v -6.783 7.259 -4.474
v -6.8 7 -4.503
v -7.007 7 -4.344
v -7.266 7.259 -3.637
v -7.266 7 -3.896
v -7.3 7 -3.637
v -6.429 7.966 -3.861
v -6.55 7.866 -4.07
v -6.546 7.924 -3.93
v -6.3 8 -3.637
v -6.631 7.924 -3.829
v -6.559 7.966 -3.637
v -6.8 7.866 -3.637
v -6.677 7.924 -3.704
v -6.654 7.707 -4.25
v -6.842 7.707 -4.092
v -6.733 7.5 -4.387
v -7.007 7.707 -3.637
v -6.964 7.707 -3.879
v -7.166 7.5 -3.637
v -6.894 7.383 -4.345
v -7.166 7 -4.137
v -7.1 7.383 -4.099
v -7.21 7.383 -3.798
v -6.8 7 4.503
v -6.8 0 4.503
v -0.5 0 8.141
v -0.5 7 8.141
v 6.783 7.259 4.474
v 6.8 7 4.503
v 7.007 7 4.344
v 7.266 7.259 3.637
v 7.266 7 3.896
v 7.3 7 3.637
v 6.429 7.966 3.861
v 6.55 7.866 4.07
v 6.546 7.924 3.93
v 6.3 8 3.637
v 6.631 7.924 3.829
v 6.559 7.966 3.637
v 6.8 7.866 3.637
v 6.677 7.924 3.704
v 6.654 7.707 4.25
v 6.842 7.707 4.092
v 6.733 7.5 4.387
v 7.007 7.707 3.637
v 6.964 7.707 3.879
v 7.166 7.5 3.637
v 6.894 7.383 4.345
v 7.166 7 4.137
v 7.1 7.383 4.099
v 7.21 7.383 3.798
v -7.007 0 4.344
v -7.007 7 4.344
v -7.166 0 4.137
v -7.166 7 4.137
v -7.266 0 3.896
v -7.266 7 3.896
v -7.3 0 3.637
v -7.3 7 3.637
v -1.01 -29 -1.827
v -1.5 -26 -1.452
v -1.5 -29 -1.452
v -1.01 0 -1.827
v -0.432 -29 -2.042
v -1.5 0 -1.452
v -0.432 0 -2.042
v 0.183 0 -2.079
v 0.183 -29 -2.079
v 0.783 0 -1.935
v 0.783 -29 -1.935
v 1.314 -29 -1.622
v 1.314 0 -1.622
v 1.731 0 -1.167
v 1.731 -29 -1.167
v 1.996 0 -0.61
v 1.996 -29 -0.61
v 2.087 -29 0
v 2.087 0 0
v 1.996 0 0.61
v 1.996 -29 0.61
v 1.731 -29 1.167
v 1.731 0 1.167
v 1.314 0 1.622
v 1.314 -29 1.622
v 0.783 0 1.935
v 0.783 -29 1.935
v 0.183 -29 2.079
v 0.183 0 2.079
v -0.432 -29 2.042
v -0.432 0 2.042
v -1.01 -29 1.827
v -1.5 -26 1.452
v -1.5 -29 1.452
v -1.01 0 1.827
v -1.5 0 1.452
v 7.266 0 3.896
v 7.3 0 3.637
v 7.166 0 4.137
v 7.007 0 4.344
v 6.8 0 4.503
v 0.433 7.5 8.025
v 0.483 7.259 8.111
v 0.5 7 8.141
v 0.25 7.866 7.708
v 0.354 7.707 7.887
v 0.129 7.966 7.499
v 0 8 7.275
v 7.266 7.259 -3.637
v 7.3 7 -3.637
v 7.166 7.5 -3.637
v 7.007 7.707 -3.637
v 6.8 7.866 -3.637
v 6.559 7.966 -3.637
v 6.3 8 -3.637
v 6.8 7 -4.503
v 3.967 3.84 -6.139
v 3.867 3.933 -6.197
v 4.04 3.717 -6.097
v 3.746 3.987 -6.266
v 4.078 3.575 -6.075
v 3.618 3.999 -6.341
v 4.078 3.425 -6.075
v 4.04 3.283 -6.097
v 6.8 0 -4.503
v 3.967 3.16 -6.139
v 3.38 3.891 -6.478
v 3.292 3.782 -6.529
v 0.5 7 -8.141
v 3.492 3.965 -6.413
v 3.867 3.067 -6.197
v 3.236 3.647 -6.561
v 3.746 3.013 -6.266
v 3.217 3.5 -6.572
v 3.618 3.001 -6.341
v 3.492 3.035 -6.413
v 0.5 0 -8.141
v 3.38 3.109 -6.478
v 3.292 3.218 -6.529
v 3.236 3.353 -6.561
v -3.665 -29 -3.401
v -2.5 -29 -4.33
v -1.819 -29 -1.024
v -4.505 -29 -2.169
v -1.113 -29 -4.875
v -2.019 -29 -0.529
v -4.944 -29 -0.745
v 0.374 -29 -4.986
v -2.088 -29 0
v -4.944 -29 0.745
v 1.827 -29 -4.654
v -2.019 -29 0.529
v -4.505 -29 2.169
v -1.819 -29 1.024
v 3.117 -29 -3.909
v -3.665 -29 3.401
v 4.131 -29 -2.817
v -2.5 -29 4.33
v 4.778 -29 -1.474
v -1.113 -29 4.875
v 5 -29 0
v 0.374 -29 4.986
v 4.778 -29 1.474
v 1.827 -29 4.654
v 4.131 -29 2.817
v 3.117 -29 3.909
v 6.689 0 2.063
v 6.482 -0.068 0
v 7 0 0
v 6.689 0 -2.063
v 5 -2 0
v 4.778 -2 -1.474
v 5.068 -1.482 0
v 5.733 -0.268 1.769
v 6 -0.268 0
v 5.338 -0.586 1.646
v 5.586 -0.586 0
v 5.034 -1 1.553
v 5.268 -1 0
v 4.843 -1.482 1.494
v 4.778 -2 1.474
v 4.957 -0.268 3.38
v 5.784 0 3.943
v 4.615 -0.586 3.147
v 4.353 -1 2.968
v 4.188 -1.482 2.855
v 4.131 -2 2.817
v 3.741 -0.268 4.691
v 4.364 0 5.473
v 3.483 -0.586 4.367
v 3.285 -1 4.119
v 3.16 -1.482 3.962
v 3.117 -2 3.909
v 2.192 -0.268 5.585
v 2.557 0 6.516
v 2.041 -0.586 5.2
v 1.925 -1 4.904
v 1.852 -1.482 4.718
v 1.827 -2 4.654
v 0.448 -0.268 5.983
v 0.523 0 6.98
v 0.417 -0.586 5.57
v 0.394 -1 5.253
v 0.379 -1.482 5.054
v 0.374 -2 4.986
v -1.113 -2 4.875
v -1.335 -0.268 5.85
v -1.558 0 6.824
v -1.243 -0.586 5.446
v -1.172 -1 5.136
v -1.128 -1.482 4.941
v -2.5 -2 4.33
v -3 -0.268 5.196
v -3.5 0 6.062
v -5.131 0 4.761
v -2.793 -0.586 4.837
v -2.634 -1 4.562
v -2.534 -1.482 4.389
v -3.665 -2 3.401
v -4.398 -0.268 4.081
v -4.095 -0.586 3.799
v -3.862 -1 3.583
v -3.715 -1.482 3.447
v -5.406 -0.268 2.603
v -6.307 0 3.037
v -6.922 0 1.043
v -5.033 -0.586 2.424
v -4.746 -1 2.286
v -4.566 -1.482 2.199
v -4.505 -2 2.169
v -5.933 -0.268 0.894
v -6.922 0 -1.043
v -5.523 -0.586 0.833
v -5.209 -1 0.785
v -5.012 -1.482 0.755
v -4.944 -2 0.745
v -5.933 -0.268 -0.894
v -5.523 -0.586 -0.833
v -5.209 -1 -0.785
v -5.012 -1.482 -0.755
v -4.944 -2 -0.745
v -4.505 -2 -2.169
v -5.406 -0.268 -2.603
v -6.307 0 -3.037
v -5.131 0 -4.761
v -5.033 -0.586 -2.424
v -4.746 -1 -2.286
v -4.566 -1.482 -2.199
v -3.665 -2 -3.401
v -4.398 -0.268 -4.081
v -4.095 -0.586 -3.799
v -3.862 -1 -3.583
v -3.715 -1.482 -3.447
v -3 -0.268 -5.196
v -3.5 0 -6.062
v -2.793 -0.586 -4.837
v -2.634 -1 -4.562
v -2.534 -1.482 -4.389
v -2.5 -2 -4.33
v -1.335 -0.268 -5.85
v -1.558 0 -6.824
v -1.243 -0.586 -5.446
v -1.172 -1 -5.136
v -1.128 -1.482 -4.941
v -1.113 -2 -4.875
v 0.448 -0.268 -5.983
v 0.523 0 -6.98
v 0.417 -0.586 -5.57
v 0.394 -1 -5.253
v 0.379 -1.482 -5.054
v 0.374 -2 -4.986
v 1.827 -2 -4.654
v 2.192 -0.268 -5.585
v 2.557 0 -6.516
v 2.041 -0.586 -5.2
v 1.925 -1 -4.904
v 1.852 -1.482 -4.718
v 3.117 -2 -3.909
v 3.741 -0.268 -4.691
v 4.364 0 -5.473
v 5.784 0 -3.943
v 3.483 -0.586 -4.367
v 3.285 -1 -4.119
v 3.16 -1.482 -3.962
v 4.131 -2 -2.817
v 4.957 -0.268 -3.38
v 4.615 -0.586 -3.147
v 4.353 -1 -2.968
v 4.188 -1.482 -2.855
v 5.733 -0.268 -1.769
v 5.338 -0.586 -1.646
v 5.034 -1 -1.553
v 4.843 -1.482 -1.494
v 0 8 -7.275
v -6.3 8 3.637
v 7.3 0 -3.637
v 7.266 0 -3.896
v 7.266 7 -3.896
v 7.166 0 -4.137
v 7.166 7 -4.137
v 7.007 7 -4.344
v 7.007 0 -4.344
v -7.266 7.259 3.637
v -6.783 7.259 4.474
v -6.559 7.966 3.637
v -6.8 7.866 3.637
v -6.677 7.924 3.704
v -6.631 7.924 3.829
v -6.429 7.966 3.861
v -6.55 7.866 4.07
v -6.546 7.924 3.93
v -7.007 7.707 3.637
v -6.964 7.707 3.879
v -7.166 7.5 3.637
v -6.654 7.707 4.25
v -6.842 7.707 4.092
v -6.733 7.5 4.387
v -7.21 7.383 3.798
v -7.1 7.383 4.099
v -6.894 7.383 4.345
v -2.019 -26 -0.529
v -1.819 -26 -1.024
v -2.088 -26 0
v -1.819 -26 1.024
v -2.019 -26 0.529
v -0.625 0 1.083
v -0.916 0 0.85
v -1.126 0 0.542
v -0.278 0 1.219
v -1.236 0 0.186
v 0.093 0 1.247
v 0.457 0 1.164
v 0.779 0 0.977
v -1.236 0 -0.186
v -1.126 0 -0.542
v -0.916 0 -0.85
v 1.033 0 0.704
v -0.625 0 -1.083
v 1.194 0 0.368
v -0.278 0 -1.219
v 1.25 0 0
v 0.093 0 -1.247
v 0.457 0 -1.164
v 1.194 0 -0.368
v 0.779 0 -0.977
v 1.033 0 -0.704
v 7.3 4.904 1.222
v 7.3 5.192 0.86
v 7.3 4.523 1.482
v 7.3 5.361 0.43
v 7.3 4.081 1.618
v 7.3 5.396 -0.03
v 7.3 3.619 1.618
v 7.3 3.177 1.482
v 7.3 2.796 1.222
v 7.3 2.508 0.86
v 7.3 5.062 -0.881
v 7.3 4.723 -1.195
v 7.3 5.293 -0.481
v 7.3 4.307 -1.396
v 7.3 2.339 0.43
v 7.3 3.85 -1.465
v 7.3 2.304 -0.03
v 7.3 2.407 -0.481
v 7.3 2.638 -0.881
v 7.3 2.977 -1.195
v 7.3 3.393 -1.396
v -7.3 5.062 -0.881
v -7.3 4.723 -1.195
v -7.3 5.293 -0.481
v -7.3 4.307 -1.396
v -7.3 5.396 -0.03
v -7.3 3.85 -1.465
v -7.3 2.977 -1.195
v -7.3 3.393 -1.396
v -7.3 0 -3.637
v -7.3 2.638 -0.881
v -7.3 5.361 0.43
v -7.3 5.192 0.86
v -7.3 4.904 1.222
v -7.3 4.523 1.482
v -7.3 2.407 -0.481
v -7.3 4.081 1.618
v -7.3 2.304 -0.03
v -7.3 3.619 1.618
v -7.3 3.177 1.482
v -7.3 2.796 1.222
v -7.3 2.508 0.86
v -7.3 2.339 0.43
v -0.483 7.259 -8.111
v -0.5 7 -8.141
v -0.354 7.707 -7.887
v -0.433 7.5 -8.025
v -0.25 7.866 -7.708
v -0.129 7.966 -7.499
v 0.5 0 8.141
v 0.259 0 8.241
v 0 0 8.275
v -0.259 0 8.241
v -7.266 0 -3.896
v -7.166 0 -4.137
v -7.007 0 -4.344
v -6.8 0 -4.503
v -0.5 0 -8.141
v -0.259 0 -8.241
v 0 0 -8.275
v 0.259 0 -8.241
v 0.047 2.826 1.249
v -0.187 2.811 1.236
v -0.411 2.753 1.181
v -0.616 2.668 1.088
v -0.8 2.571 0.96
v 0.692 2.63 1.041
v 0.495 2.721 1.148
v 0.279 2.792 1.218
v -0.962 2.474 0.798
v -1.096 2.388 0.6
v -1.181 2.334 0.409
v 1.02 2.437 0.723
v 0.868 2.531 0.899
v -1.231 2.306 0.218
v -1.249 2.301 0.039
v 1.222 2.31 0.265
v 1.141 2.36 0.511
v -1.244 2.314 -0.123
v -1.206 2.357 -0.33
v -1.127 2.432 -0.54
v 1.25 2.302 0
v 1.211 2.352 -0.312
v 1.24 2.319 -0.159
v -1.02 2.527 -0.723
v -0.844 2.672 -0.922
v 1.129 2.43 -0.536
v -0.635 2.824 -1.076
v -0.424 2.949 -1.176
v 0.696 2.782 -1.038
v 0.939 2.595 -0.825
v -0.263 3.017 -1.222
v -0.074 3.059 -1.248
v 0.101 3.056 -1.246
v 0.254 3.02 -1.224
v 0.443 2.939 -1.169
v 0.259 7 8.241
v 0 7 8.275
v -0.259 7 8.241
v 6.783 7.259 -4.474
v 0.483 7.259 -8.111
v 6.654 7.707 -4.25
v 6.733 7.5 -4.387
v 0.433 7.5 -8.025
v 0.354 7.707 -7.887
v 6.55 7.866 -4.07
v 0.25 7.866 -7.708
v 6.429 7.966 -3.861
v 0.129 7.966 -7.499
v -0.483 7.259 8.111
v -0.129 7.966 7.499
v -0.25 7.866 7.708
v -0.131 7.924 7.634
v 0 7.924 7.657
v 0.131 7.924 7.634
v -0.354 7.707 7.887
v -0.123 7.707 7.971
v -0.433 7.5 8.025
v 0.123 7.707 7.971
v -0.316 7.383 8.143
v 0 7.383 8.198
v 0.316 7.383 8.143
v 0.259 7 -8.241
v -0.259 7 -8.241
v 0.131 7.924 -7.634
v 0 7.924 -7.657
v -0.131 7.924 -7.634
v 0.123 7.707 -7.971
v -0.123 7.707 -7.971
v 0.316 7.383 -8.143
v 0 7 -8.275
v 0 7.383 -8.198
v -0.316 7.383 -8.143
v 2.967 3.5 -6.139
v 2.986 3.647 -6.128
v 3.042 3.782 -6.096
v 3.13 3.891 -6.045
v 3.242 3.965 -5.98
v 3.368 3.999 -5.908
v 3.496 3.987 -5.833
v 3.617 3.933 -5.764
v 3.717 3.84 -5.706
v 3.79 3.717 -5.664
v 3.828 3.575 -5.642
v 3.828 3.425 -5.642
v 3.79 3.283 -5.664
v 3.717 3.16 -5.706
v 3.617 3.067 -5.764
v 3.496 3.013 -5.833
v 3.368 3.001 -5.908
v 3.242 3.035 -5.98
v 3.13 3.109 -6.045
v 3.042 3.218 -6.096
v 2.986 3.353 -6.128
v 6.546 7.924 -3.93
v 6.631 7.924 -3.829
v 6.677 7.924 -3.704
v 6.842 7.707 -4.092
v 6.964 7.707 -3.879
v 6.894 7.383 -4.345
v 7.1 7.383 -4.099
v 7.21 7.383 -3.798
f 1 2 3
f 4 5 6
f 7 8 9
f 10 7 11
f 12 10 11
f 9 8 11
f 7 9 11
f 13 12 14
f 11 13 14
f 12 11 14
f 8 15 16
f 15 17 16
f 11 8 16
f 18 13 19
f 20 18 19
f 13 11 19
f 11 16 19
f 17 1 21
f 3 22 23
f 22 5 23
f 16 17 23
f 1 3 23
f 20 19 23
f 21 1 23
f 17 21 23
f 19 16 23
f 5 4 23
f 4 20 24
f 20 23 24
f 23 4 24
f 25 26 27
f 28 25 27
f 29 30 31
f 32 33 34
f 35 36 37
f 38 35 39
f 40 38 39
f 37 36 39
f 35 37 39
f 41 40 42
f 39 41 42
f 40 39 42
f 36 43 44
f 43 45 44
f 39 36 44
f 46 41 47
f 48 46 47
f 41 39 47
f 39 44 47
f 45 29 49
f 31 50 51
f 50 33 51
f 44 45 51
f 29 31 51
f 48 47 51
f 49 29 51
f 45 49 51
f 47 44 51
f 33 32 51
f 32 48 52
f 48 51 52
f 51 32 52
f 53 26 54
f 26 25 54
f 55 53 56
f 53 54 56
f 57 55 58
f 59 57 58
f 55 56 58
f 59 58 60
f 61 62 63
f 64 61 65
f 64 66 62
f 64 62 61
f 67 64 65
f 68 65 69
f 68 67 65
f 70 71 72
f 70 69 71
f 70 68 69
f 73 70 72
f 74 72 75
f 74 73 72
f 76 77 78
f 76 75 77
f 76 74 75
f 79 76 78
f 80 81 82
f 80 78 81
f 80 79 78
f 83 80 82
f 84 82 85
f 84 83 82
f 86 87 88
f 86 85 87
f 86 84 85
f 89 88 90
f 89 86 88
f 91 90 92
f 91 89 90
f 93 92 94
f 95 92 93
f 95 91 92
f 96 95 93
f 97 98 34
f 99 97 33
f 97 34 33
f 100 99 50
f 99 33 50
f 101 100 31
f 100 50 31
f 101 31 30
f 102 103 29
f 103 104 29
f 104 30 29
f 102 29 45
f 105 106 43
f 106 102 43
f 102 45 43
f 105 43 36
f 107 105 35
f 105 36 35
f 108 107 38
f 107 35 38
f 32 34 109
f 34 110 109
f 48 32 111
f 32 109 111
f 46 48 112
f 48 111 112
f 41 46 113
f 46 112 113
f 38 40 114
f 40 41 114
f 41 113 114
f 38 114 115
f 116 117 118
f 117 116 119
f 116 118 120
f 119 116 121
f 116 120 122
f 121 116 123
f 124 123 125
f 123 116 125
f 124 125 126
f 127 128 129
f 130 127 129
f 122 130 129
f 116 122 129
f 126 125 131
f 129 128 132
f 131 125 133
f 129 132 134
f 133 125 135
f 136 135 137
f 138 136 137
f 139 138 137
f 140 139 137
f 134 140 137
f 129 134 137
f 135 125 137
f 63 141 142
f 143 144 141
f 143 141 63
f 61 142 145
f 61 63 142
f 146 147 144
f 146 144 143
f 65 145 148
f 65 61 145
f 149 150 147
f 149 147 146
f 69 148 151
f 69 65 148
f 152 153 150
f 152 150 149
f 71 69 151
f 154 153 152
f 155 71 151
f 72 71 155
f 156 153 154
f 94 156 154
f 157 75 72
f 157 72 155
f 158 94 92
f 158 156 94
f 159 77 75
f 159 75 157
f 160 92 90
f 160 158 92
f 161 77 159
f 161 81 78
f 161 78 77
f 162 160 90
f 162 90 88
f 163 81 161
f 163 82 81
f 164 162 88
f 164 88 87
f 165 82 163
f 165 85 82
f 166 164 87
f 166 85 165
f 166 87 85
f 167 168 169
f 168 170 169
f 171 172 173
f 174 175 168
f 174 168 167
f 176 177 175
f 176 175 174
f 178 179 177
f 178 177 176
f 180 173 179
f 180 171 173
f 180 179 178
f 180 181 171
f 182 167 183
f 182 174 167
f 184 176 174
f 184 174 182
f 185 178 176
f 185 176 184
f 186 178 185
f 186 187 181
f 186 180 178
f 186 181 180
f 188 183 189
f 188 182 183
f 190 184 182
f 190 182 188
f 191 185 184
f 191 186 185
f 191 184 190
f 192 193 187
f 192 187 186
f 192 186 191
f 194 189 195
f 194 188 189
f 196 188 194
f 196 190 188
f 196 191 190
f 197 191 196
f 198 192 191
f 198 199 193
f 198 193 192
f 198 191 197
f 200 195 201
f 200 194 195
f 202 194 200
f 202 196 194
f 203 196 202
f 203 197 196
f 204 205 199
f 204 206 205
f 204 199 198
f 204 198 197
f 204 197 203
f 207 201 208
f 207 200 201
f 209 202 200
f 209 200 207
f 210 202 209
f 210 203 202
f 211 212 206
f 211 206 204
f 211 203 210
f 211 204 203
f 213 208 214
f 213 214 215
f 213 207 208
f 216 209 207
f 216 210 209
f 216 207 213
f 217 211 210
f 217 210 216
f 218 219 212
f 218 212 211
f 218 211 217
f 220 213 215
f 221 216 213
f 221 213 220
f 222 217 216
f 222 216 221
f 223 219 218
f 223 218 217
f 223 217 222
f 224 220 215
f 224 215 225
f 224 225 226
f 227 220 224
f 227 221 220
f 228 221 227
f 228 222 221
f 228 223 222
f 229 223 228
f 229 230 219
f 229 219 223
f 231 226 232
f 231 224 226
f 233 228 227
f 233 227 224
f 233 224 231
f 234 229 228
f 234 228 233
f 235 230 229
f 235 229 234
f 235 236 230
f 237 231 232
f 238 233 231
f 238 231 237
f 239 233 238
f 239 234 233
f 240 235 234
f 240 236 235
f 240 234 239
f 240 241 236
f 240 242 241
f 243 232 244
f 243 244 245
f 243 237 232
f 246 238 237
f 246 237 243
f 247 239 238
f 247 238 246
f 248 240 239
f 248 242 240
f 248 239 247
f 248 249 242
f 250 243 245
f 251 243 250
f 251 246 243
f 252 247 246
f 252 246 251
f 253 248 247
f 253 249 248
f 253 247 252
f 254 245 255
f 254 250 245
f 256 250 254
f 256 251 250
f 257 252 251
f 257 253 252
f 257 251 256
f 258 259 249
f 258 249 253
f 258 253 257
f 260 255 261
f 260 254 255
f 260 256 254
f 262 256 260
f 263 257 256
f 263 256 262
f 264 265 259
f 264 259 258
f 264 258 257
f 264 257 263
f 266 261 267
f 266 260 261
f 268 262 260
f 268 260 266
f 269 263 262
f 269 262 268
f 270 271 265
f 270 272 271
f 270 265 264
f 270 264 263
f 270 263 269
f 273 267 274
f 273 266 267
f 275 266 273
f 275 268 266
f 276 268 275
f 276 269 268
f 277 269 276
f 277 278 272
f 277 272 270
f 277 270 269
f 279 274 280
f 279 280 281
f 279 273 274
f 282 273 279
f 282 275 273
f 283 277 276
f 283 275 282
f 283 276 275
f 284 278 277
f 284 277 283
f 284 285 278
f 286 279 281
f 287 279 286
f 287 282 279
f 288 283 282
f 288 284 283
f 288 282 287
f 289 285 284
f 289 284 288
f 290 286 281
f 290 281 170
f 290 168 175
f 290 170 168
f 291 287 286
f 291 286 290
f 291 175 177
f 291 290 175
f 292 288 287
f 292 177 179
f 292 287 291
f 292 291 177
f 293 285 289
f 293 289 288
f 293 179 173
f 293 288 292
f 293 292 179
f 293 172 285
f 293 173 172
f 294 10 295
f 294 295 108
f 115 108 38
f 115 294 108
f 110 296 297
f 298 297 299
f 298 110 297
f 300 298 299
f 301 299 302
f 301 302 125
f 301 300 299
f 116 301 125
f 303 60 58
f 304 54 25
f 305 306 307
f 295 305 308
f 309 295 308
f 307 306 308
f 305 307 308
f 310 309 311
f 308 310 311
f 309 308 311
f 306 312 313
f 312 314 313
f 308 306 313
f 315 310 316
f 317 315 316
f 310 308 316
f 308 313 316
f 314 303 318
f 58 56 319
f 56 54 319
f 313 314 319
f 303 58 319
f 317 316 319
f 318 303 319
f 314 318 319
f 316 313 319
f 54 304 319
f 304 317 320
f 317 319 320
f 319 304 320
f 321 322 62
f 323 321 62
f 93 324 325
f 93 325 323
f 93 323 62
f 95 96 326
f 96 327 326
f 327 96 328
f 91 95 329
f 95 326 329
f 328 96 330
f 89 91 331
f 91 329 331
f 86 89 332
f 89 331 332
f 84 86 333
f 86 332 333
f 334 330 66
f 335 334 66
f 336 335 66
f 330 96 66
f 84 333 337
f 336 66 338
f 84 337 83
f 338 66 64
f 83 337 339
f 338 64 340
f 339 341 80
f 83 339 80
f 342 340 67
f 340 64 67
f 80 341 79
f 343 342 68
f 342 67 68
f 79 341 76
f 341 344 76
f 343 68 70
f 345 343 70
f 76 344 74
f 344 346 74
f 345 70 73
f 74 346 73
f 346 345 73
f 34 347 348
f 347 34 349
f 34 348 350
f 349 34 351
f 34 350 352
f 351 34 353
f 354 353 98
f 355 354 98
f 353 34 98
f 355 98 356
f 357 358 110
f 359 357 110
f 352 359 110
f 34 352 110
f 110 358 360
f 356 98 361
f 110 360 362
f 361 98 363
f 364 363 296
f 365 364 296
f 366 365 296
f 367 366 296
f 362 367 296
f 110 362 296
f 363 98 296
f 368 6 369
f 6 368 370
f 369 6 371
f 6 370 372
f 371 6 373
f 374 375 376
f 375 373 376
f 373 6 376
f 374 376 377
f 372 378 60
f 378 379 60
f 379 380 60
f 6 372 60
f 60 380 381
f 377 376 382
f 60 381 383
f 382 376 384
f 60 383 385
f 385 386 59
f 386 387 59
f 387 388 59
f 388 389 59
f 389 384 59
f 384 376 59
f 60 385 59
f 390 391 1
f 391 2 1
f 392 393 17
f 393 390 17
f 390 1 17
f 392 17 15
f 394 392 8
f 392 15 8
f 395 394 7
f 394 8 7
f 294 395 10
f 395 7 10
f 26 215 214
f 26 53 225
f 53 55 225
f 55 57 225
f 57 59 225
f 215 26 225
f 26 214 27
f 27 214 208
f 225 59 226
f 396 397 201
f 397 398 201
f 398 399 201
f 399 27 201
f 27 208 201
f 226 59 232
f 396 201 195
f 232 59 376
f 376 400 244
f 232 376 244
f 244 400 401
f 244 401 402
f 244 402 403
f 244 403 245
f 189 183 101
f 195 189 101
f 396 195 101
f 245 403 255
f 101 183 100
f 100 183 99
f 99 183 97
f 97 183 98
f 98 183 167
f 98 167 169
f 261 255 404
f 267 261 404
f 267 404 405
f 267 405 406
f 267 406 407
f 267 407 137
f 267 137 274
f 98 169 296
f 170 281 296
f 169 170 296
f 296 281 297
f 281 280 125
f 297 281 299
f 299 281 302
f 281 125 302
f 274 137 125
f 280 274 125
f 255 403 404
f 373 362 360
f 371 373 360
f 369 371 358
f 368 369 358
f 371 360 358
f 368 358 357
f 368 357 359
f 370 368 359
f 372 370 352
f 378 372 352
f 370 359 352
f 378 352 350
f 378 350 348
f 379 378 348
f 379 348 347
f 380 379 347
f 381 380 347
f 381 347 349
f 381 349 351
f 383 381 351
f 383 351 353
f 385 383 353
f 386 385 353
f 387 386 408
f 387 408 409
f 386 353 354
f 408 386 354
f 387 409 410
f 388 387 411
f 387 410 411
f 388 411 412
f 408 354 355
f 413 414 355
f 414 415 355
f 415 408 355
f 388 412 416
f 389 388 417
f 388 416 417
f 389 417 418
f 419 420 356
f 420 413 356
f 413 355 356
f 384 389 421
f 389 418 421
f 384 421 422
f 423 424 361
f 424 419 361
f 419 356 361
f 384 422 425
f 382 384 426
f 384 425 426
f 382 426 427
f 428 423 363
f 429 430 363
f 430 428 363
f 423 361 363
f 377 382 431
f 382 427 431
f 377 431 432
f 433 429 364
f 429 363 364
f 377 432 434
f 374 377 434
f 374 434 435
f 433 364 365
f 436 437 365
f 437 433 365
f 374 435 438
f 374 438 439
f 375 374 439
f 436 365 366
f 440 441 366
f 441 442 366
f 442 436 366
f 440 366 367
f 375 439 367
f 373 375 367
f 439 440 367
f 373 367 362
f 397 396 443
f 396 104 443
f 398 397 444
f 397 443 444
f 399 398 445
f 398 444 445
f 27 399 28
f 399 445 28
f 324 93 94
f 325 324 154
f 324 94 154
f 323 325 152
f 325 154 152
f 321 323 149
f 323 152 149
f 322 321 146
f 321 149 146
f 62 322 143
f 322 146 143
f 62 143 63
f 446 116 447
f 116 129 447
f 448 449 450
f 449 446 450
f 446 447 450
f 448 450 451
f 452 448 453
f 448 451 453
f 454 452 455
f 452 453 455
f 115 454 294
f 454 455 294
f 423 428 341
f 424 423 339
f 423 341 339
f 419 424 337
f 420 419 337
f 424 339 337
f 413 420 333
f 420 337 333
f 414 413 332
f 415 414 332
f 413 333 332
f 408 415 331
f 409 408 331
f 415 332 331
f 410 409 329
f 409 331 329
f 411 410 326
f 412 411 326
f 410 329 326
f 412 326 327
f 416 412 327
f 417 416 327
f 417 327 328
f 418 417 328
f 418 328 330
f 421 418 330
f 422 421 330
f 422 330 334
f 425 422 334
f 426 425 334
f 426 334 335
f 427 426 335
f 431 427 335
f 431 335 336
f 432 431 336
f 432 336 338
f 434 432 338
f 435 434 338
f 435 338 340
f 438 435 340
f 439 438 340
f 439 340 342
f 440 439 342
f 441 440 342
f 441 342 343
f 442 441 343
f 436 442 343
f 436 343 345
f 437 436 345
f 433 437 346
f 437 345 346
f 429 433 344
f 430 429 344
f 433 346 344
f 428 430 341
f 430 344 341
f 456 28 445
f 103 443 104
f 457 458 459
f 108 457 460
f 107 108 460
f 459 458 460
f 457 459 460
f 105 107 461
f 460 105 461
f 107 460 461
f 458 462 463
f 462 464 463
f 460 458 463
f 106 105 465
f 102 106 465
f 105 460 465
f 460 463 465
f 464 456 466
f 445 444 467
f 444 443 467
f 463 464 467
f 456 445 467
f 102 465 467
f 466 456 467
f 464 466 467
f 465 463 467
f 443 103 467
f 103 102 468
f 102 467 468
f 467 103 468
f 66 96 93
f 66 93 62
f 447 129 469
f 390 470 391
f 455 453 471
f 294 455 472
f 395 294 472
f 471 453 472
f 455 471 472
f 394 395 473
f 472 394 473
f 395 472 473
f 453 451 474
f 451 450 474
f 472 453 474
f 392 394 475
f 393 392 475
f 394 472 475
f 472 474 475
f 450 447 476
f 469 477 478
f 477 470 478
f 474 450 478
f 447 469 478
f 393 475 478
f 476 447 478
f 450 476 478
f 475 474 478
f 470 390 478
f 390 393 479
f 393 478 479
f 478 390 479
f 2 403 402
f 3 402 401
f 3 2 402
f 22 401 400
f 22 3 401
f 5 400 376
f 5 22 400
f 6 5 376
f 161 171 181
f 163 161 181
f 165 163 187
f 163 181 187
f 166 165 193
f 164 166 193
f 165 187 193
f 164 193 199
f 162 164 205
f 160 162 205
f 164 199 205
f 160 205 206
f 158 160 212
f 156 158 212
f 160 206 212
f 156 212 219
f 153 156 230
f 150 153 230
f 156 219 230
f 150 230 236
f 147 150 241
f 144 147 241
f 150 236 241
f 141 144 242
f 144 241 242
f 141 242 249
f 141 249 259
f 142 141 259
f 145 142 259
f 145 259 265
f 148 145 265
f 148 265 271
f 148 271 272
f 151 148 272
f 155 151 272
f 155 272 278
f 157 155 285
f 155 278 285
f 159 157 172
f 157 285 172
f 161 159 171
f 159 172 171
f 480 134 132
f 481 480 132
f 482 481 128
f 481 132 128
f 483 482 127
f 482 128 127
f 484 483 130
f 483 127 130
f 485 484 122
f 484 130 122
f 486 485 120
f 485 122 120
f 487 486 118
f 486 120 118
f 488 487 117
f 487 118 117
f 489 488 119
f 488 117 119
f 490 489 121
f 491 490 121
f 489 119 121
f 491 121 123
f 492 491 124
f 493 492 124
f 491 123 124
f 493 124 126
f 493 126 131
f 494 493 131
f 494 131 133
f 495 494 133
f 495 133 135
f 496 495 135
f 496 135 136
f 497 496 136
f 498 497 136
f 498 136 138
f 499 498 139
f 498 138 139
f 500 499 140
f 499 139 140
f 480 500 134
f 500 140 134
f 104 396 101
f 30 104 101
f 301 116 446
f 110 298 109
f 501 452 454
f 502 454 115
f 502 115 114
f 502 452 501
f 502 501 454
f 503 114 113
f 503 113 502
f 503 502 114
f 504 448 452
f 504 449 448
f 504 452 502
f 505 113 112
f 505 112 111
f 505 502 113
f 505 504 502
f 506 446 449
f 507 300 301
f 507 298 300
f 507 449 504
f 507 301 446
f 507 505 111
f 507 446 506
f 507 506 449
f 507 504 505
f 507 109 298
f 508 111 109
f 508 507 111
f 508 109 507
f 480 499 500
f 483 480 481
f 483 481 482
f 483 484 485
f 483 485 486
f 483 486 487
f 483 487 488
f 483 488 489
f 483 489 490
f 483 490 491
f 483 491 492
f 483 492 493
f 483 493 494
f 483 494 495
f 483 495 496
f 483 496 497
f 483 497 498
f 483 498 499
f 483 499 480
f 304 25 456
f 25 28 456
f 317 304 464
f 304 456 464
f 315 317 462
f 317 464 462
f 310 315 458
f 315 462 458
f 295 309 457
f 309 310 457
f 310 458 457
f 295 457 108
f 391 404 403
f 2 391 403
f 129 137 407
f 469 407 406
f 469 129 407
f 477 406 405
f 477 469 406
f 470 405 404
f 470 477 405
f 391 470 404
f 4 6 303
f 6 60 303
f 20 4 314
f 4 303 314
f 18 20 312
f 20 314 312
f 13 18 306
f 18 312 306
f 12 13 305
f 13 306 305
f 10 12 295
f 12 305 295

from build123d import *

# Parameters (mm, degrees)
BOSS_EXTRUDE1_DEPTH = 8
SKETCH2_R           = 5
BOSS_EXTRUDE2_DEPTH = 29
FILLET1_R           = 2
SKETCH3_R           = 1.55
CUT_EXTRUDE1_DEPTH  = 15.6
FILLET2_R           = 1
SKETCH5_R           = 2.0875
CUT_EXTRUDE3_DEPTH  = 3
CUT_EXTRUDE4_REACH  = 10
SKETCH6_R           = 1.25
SKETCH7_R           = 0.5
CUT_EXTRUDE5_DEPTH  = 0.5


with BuildPart() as part:
    # Sketch1 → Boss-Extrude1 (new body)
    with BuildSketch(Plane(origin=(0, 0, 0), x_dir=(1, 0, 0), z_dir=(0, 1, 0))):
        Polygon((7.3, -4.214656965), (7.3, 4.214656965), (0, 8.42931393), (-7.3, 4.214656965), (-7.3, -4.214656965), (0, -8.42931393), align=None)
    extrude(amount=BOSS_EXTRUDE1_DEPTH)

    # Sketch2 → Boss-Extrude2 (add)
    with BuildSketch(Plane.XZ):
        Circle(SKETCH2_R)
        with BuildLine():
            Line((-1.5, 1.451776928), (-1.5, -1.451776928))
            ThreePointArc((-1.5, -1.451776928), (2.0875, 0), (-1.5, 1.451776928))
        make_face(mode=Mode.SUBTRACT)
    extrude(amount=BOSS_EXTRUDE2_DEPTH)

    # Fillet1
    fillet1_edges = [part.edges().sort_by_distance(p)[0] for p in [
        (-5, 0, 0),
    ]]
    fillet(fillet1_edges, radius=FILLET1_R)

    # Sketch3 → Cut-Extrude1 (cut, through all)
    with BuildSketch(Plane(origin=(7.3, 0, 0), x_dir=(0, 0, -1), z_dir=(1, 0, 0))):
        with Locations((-0.085343035, 3.85)):
            Circle(SKETCH3_R)
    extrude(amount=-CUT_EXTRUDE1_DEPTH, mode=Mode.SUBTRACT)

    # Fillet2
    fillet2_edges = [part.edges().sort_by_distance(p)[0] for p in [
        (0, 4, 8.42931393),
        (-7.3, 4, 4.214656965),
        (-7.3, 4, -4.214656965),
        (0, 4, -8.42931393),
        (7.3, 4, -4.214656965),
        (7.3, 4, 4.214656965),
        (3.65, 8, -6.321985448),
        (-3.65, 8, -6.321985448),
        (-7.3, 8, 0),
        (-3.65, 8, 6.321985448),
        (3.65, 8, 6.321985448),
        (7.3, 8, 0),
    ]]
    fillet(fillet2_edges, radius=FILLET2_R)

    # Sketch5 → Cut-Extrude3 (cut)
    with BuildSketch(Plane.XZ.offset(29)):
        Circle(SKETCH5_R)
    extrude(amount=-CUT_EXTRUDE3_DEPTH, mode=Mode.SUBTRACT)

    # Sketch6 → Cut-Extrude4 (cut, up to next)
    with BuildSketch(Plane.XZ, mode=Mode.PRIVATE) as cut_extrude4_sk1:
        Circle(SKETCH6_R)
    cut_extrude4_tool1 = extrude(cut_extrude4_sk1.sketch, amount=-CUT_EXTRUDE4_REACH, mode=Mode.PRIVATE) & part.part
    add(cut_extrude4_tool1.solids().sort_by_distance((0, 0, 0))[0], mode=Mode.SUBTRACT)

    # Sketch7 → Cut-Extrude5 (cut)
    with BuildSketch(Plane(origin=(3.65, 0, -6.321985448), x_dir=(-0.866025404, 0, -0.5), z_dir=(0.5, 0, -0.866025404))):
        with Locations((0, 3.5)):
            Circle(SKETCH7_R)
    extrude(amount=-CUT_EXTRUDE5_DEPTH, mode=Mode.SUBTRACT)


solid = part.part
